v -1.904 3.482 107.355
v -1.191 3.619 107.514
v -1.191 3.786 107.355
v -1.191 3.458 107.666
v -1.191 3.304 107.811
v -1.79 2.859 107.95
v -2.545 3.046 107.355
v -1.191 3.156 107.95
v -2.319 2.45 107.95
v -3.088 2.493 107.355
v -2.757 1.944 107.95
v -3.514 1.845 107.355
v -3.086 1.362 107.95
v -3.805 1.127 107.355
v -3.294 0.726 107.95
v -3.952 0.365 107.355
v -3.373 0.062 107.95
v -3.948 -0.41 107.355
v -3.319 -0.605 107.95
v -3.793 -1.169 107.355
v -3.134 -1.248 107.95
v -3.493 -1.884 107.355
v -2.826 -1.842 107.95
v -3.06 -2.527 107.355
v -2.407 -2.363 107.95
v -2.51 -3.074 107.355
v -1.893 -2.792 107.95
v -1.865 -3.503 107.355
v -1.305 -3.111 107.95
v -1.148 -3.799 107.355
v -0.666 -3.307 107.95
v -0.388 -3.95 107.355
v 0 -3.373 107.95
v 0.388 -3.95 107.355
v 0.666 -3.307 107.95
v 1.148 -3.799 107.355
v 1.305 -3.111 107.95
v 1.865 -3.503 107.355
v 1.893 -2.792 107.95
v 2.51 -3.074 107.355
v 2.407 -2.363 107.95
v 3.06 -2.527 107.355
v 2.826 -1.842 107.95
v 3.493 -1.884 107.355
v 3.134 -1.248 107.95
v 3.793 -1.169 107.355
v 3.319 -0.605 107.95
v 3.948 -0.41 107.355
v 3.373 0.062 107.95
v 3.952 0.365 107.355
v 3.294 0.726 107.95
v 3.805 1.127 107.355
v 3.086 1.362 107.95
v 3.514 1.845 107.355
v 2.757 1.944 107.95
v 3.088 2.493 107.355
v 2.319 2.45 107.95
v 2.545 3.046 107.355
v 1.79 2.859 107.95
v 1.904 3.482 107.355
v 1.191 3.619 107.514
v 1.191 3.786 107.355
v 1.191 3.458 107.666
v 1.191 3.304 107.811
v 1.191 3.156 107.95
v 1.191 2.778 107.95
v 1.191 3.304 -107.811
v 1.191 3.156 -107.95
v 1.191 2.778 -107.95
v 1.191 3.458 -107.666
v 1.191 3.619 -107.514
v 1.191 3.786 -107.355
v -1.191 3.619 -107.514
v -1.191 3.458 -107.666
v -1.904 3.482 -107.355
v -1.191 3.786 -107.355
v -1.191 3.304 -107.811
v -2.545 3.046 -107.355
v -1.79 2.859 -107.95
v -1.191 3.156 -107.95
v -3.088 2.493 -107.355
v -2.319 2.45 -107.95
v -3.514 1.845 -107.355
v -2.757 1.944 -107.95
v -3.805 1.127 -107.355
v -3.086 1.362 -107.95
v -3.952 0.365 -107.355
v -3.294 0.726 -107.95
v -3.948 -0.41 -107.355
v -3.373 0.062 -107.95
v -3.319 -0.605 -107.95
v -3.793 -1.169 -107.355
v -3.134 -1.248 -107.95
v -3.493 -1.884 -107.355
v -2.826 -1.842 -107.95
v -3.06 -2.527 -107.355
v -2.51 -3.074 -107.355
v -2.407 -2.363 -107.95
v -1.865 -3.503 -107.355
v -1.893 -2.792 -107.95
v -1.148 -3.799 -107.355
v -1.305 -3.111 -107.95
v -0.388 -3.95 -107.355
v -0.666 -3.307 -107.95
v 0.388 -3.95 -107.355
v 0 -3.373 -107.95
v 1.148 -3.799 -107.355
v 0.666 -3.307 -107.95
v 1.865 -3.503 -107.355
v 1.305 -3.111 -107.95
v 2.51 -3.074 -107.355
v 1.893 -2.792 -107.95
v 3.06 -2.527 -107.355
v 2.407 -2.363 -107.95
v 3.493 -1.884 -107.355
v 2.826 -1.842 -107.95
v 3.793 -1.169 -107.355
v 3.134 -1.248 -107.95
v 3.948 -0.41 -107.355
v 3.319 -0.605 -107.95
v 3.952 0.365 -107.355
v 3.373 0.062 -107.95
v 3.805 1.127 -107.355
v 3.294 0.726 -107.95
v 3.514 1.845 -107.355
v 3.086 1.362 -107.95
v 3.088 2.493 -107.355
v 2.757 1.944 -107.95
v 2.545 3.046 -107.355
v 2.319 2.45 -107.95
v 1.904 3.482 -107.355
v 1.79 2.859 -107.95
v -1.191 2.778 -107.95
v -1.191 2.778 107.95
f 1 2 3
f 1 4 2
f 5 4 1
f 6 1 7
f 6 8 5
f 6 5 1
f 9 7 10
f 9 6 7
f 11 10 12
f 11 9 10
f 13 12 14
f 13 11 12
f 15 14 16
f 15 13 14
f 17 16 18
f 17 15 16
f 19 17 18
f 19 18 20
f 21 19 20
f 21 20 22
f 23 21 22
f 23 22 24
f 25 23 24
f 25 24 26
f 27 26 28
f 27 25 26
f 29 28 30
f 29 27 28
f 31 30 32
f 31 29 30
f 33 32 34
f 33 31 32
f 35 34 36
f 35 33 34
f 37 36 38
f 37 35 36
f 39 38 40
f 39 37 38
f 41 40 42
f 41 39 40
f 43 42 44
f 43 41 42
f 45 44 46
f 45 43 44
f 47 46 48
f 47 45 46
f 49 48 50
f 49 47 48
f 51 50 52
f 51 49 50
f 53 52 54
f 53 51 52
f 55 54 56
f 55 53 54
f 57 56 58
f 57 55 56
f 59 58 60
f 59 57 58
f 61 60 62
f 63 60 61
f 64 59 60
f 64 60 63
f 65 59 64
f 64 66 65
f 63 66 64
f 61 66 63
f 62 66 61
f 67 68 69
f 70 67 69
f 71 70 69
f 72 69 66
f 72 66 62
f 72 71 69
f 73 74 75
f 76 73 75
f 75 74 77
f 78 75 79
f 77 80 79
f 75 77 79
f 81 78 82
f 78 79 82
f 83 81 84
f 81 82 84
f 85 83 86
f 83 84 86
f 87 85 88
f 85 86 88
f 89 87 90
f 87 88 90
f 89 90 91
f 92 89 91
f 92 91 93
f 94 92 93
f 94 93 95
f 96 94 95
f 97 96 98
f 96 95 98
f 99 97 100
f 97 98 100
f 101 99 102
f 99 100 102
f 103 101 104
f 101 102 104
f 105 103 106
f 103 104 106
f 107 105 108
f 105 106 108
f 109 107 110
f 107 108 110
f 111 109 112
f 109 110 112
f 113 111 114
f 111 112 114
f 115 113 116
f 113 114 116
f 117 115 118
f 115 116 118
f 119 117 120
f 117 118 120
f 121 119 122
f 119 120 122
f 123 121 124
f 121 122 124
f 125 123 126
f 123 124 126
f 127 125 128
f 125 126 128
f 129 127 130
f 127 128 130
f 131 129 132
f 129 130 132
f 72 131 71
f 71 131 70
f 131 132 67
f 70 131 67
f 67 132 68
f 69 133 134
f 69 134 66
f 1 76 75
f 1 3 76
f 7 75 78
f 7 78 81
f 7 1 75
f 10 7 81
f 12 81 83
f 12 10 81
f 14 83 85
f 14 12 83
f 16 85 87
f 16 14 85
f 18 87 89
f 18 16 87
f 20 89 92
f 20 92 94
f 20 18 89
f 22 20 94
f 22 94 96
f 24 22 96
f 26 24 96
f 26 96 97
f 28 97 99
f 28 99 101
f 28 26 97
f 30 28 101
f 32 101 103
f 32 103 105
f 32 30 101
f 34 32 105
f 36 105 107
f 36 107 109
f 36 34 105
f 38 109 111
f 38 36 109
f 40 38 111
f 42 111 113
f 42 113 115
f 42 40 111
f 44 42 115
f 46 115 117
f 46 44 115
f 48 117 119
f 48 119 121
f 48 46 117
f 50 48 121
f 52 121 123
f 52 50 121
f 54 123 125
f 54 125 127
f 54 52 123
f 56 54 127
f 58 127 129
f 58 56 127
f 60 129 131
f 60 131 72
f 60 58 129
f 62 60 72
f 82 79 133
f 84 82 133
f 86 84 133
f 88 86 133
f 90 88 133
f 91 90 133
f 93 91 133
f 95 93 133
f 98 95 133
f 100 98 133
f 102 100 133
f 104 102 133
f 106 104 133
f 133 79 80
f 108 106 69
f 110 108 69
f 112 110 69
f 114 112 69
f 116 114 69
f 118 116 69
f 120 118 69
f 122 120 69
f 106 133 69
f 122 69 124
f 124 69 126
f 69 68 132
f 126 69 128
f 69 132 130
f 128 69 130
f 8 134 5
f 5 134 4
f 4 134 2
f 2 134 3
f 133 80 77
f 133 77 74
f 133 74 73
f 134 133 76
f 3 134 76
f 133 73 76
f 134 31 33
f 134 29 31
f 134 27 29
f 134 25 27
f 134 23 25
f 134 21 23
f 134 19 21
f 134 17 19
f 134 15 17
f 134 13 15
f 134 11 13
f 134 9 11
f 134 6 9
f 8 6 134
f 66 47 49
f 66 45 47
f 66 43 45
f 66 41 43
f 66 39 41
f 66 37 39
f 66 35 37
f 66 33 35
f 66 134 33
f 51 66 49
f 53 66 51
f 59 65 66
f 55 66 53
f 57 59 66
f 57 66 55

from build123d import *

# Parameters (mm, degrees)
SKETCH1_R           = 3.96875
EXTRUDE1_DEPTH      = 107.95
CHAMFER1_SIZE       = 0.5953125
EXTRUDE2_DEPTH      = 109.09581145
EXTRUDE2_DEPTH_BACK = 109.09581145
SKETCH3_W           = 2.38125
SKETCH3_H           = 1.190625


with BuildPart() as part:
    # Sketch1 → Extrude1 (new, symmetric)
    with BuildSketch(Plane.XY):
        Circle(SKETCH1_R)
    extrude(amount=EXTRUDE1_DEPTH, both=True)

    # Chamfer1
    chamfer1_edges = [part.edges().sort_by_distance(p)[0] for p in [
        (-3.96875, 0, -107.95),
        (-3.96875, 0, 107.95),
    ]]
    chamfer(chamfer1_edges, length=CHAMFER1_SIZE)

    # Sketch3 → Extrude2 (cut, two sides: drawn at the far end of the back side and taken through both)
    with BuildSketch(Plane.XY.offset(-EXTRUDE2_DEPTH_BACK)):
        with Locations((0, 3.3734375)):
            Rectangle(SKETCH3_W, SKETCH3_H)
    extrude(amount=EXTRUDE2_DEPTH + EXTRUDE2_DEPTH_BACK, mode=Mode.SUBTRACT)


solid = part.part
